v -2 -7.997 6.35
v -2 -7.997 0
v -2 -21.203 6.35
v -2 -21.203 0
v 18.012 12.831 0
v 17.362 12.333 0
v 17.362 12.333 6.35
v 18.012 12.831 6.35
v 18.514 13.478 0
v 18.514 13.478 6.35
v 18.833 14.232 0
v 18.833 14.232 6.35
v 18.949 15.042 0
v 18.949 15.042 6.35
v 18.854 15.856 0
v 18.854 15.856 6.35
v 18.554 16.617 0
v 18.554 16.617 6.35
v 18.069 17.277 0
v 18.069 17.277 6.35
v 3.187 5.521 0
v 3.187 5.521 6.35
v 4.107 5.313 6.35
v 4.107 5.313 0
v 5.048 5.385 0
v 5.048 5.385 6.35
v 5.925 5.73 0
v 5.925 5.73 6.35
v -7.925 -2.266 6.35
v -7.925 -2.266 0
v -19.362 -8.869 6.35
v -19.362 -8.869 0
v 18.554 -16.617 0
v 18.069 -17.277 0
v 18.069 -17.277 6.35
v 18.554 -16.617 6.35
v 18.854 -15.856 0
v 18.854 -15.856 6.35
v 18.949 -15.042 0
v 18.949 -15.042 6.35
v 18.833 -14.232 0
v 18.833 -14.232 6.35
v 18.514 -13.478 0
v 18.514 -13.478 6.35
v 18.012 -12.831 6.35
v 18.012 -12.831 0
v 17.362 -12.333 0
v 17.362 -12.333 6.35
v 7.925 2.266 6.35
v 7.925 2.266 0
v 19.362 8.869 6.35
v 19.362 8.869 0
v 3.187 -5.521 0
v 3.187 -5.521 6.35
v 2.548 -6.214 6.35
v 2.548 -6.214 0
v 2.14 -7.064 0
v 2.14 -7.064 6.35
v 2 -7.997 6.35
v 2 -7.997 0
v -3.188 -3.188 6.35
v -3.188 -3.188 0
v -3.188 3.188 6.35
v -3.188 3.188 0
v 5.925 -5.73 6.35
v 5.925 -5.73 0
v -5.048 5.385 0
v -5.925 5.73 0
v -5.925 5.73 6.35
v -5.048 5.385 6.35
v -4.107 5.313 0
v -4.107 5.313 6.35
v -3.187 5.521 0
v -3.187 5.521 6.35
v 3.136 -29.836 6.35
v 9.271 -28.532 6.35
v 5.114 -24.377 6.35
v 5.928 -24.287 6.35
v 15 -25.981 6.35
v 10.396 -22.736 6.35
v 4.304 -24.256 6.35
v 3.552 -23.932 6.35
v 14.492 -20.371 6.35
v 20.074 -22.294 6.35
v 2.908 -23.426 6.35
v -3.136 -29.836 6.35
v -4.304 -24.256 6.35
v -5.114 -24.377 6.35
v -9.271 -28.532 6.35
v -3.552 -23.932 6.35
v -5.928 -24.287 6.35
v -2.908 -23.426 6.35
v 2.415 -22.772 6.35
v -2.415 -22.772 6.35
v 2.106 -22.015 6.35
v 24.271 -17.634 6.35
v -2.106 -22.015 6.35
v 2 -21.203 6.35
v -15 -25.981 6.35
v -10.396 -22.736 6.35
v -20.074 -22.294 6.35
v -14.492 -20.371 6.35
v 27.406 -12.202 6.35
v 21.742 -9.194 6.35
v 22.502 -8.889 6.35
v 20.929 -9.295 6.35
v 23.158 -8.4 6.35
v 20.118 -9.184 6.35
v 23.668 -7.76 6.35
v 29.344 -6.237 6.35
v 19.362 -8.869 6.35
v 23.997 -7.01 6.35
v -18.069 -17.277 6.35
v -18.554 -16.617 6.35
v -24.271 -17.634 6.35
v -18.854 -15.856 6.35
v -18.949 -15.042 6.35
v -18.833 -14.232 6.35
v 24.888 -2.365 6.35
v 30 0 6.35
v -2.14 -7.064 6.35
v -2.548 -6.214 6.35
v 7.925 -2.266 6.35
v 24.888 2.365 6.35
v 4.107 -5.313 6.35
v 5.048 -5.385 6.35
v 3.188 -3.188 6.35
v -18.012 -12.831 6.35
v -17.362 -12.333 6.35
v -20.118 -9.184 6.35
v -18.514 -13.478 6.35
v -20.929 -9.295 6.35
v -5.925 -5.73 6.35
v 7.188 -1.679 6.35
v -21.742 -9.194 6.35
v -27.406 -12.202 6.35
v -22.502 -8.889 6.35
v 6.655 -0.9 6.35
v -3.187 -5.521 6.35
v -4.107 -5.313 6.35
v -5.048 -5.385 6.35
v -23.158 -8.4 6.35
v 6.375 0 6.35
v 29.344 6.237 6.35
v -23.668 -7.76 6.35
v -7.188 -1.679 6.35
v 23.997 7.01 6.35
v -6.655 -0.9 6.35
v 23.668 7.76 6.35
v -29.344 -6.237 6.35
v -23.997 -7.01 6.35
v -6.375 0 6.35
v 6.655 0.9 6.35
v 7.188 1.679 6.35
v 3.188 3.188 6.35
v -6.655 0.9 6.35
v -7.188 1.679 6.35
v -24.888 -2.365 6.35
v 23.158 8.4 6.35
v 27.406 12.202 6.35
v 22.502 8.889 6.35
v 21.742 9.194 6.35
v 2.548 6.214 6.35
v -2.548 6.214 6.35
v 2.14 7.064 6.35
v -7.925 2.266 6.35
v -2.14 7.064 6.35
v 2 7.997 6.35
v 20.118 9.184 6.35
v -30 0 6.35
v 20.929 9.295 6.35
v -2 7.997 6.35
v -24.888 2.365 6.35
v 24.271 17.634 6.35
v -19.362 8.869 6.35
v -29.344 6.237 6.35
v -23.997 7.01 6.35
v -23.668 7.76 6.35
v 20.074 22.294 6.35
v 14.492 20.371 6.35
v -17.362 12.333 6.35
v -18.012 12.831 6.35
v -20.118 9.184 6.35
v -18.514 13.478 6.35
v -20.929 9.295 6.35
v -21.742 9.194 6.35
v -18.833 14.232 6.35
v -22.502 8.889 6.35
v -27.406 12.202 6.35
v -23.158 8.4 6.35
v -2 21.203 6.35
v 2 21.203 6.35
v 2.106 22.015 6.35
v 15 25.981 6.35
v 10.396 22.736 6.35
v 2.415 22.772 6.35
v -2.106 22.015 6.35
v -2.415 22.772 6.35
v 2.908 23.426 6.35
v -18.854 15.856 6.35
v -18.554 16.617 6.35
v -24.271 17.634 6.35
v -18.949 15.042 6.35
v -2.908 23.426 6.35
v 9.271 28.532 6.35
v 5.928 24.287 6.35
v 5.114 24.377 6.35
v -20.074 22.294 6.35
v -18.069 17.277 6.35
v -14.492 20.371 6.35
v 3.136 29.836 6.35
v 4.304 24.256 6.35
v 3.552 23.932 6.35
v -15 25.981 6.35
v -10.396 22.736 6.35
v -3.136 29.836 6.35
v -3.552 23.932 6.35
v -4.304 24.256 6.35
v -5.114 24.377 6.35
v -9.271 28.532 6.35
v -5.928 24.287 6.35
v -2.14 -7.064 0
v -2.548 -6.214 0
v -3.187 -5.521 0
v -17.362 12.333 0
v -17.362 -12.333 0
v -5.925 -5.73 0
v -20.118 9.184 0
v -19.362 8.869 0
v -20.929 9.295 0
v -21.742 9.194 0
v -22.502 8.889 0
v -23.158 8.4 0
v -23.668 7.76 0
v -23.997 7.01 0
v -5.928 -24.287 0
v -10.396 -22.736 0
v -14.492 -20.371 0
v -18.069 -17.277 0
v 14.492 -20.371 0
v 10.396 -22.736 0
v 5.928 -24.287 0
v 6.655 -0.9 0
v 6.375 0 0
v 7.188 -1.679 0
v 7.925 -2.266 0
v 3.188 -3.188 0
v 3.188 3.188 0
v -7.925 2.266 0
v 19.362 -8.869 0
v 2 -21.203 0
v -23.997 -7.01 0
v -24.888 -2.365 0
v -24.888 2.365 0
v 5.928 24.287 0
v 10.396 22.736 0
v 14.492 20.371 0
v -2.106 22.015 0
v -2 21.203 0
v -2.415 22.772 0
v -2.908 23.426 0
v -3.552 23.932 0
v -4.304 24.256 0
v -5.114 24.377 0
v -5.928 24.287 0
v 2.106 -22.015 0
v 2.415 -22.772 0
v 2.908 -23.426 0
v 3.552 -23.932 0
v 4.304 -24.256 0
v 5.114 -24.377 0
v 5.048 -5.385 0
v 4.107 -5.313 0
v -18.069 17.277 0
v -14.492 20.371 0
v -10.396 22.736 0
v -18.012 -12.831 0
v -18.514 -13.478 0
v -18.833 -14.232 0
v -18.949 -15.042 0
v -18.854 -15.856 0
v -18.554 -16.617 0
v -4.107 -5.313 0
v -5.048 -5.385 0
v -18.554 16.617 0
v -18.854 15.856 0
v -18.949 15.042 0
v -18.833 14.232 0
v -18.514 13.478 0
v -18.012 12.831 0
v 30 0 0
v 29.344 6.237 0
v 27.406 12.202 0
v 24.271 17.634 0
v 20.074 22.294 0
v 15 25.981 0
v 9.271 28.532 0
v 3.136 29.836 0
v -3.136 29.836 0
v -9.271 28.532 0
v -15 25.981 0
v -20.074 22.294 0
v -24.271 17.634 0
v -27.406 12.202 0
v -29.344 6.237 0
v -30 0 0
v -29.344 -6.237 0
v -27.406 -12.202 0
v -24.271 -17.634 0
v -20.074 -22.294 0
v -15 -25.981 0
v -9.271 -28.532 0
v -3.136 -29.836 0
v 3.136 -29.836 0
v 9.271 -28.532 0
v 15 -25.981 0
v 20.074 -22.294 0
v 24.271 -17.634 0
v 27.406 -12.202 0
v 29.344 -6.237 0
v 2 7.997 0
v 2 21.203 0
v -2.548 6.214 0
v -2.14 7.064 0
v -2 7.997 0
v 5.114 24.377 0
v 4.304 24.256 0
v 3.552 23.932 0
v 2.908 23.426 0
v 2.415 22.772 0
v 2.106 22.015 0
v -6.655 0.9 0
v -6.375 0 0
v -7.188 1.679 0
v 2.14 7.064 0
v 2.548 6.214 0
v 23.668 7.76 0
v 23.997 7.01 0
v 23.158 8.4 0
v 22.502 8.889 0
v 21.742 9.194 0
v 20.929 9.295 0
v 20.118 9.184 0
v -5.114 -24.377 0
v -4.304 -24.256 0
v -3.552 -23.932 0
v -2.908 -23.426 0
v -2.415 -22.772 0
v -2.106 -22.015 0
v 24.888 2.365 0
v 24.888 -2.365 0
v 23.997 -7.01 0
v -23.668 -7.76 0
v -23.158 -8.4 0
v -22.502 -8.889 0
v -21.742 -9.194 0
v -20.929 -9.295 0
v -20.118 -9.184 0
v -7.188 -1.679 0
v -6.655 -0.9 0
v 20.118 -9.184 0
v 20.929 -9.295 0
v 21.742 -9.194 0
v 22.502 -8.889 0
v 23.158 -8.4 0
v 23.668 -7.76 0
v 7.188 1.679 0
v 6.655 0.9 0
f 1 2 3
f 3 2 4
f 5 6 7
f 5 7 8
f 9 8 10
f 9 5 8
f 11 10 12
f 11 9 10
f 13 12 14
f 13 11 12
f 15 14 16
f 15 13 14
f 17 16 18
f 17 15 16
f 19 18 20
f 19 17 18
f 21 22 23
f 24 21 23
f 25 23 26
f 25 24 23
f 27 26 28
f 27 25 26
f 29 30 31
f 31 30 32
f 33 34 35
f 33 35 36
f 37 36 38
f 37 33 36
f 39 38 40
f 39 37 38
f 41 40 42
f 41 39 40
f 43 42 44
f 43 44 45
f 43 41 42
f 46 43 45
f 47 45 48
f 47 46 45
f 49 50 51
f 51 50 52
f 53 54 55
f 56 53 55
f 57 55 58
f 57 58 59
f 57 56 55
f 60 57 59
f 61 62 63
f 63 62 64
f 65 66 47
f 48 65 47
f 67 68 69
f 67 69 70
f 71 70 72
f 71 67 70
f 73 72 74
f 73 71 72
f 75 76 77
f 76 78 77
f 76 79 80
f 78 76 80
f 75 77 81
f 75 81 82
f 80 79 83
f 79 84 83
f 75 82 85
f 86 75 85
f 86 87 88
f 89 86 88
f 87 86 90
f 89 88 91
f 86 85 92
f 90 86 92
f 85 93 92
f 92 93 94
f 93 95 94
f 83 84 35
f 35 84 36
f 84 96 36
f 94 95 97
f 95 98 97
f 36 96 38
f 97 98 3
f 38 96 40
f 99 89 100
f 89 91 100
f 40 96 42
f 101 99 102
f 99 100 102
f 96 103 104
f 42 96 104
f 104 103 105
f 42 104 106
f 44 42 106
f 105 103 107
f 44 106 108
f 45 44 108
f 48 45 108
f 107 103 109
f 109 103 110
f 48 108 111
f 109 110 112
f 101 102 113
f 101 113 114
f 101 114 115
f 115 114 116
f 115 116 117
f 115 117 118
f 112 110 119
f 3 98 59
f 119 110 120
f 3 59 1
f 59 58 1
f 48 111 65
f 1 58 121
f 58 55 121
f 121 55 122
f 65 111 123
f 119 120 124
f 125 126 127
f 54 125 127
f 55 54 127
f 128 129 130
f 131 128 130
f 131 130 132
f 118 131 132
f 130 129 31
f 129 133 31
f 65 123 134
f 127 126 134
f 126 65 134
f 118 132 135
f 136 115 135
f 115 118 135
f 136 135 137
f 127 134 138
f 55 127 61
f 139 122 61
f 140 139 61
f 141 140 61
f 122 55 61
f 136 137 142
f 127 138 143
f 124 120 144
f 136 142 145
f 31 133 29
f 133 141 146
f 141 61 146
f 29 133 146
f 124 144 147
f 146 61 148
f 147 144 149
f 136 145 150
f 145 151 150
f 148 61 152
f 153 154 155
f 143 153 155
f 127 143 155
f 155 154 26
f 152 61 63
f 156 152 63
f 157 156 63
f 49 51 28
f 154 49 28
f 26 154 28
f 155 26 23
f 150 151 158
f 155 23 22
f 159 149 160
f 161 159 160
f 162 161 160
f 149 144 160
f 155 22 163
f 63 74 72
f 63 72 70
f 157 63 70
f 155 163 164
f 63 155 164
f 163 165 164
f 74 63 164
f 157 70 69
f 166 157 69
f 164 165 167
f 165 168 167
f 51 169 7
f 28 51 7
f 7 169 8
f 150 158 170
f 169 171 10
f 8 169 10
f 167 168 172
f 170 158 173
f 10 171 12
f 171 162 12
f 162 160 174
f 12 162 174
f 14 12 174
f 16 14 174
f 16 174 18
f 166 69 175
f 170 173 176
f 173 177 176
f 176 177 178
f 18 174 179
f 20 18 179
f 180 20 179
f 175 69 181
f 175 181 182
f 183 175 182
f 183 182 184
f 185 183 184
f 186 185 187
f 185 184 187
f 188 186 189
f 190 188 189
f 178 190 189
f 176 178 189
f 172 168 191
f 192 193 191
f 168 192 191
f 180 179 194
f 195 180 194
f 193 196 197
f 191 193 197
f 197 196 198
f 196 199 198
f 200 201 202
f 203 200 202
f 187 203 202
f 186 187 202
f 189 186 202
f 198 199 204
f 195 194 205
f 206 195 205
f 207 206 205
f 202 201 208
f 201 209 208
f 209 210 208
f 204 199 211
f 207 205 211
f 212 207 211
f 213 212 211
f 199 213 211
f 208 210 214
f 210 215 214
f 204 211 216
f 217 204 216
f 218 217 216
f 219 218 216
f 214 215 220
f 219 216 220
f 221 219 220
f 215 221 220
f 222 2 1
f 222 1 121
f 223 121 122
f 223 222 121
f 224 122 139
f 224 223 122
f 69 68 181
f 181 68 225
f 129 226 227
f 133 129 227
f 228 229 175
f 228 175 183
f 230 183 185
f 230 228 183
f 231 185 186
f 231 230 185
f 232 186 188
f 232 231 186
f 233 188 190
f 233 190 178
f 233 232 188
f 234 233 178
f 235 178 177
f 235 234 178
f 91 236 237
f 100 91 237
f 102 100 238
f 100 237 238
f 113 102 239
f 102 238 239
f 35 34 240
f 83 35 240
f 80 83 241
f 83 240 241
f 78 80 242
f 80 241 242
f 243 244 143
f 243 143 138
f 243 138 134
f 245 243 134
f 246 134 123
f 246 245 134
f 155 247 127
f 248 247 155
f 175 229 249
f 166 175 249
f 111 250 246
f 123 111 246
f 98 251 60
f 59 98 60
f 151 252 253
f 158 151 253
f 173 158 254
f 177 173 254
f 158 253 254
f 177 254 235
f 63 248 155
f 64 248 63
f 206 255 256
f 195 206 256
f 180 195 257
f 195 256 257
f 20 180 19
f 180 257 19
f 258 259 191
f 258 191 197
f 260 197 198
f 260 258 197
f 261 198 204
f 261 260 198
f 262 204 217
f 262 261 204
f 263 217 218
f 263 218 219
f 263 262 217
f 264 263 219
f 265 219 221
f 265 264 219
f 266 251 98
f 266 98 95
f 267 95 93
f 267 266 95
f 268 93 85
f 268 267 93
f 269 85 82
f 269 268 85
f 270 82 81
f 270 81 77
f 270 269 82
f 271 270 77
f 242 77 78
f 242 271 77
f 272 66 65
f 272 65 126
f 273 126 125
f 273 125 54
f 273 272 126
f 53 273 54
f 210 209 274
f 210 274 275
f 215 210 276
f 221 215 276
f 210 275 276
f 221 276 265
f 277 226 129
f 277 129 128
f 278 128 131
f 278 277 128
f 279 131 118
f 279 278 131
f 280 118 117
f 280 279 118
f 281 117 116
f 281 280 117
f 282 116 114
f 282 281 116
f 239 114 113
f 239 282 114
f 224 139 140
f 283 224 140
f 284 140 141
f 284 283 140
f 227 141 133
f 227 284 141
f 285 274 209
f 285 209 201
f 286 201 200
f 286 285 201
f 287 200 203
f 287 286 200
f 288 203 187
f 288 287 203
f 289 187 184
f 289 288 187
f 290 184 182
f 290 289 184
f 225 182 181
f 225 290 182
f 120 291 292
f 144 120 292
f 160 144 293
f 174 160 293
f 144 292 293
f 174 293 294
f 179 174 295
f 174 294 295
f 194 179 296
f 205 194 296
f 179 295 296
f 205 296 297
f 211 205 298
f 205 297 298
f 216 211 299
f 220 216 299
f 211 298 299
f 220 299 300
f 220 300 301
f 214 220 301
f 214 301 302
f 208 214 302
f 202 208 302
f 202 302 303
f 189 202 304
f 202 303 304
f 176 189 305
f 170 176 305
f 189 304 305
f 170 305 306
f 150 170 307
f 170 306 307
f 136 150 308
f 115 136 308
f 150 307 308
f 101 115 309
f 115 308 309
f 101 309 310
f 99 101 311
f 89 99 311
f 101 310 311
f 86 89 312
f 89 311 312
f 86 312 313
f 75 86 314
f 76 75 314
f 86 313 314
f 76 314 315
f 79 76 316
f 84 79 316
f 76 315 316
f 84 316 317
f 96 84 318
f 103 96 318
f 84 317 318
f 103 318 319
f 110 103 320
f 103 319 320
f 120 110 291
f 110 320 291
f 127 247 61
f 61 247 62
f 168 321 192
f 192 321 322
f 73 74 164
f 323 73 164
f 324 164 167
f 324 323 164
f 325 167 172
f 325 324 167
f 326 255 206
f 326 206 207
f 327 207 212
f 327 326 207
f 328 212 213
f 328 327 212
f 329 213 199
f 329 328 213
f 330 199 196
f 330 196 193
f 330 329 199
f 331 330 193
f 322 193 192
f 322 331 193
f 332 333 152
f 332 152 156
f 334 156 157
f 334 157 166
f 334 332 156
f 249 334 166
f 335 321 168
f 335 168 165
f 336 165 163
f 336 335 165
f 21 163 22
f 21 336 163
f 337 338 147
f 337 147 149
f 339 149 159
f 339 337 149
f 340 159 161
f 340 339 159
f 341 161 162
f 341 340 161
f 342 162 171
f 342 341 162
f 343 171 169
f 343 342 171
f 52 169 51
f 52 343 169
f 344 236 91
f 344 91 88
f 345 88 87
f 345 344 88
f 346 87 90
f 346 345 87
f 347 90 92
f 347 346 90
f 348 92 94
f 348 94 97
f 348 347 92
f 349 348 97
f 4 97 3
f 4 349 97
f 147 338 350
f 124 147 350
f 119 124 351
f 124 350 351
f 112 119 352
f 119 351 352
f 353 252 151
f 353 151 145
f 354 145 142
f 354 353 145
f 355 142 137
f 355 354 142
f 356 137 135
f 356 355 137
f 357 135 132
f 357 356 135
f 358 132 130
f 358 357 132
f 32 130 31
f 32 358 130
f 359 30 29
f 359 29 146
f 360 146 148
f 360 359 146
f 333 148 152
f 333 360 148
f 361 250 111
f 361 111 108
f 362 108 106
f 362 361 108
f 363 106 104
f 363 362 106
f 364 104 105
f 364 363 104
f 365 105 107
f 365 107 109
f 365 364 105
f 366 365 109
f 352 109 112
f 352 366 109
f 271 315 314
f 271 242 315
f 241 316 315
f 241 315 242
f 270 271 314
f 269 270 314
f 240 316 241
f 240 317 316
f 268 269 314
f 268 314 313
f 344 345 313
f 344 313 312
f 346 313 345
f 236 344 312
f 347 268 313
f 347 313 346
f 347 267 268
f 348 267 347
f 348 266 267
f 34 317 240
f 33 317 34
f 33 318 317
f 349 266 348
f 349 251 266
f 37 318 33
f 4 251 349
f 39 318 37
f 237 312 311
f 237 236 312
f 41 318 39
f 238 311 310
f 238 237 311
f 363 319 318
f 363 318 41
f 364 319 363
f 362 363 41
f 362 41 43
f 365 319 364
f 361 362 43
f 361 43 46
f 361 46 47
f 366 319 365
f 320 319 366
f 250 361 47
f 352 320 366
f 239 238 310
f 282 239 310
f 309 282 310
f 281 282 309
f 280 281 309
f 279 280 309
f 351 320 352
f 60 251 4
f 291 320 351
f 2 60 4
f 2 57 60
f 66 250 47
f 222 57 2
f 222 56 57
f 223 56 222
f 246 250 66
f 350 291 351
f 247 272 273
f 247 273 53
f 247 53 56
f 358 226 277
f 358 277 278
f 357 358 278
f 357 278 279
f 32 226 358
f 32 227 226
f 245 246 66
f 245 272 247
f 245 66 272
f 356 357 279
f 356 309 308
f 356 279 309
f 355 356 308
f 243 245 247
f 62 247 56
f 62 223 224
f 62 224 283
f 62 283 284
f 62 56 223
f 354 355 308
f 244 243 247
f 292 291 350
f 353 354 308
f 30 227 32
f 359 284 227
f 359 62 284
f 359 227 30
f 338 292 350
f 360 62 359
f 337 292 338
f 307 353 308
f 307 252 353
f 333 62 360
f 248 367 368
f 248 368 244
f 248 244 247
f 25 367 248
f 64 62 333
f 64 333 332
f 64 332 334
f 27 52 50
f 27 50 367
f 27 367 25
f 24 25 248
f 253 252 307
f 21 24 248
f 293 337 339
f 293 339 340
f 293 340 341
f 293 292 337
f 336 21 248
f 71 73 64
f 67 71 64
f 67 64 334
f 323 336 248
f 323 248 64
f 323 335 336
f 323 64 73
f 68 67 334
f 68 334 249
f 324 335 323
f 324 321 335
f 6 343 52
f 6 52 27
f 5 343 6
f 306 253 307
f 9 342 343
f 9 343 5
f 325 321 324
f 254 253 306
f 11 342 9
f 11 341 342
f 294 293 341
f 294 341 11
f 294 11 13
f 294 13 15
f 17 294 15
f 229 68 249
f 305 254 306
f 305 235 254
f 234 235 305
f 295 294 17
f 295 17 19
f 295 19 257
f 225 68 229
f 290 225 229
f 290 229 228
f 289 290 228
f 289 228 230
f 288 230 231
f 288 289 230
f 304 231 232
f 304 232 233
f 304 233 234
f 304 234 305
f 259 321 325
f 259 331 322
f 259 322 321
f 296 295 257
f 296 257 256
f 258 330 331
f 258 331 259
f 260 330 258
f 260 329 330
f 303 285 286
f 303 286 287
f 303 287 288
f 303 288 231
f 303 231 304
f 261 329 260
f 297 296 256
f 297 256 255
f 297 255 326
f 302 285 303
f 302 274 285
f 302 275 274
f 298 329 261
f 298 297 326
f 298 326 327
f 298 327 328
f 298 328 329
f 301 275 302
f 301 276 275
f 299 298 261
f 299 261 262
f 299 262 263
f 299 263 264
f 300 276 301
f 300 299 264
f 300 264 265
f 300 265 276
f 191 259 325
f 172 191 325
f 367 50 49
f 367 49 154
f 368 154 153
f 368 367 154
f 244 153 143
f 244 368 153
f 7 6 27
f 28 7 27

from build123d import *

# Parameters (mm, degrees)
SKETCH1_R           = 30
BOSS_EXTRUDE1_DEPTH = 6.35
FILLET1_R           = 3.175
SKETCH2_W           = 6.3754
SKETCH2_H           = 6.3754
CUT_EXTRUDE1_DEPTH  = 17.462


with BuildPart() as part:
    # Sketch1 → Boss-Extrude1 (new body)
    with BuildSketch(Plane.XY):
        Circle(SKETCH1_R)
        with BuildLine():
            Line((-2, 24.919871589), (-2, 6.026815079))
            ThreePointArc((-2, 6.026815079), (-3.175, 5.499261314), (-4.219374963, 4.745458347))
            Line((-4.219374963, 4.745458347), (-20.581241855, 14.191986602))
            ThreePointArc((-20.581241855, 14.191986602), (-12.5, 21.650635095), (-2, 24.919871589))
        make_face(mode=Mode.SUBTRACT)
        with BuildLine():
            Line((-22.581241855, 10.727884987), (-6.219374963, 1.281356732))
            ThreePointArc((-6.219374963, 1.281356732), (-6.35, 0), (-6.219374963, -1.281356732))
            Line((-6.219374963, -1.281356732), (-22.581241855, -10.727884987))
            ThreePointArc((-22.581241855, -10.727884987), (-25, 0), (-22.581241855, 10.727884987))
        make_face(mode=Mode.SUBTRACT)
        with BuildLine():
            Line((-20.581241855, -14.191986602), (-4.219374963, -4.745458347))
            ThreePointArc((-4.219374963, -4.745458347), (-3.175, -5.499261314), (-2, -6.026815079))
            Line((-2, -6.026815079), (-2, -24.919871589))
            ThreePointArc((-2, -24.919871589), (-12.5, -21.650635095), (-20.581241855, -14.191986602))
        make_face(mode=Mode.SUBTRACT)
        with BuildLine():
            Line((2, -24.919871589), (2, -6.026815079))
            ThreePointArc((2, -6.026815079), (3.175, -5.499261314), (4.219374963, -4.745458347))
            Line((4.219374963, -4.745458347), (20.581241855, -14.191986602))
            ThreePointArc((20.581241855, -14.191986602), (12.5, -21.650635095), (2, -24.919871589))
        make_face(mode=Mode.SUBTRACT)
        with BuildLine():
            Line((22.581241855, -10.727884987), (6.219374963, -1.281356732))
            ThreePointArc((6.219374963, -1.281356732), (6.35, 0), (6.219374963, 1.281356732))
            Line((6.219374963, 1.281356732), (22.581241855, 10.727884987))
            ThreePointArc((22.581241855, 10.727884987), (25, 0), (22.581241855, -10.727884987))
        make_face(mode=Mode.SUBTRACT)
        with BuildLine():
            Line((20.581241855, 14.191986602), (4.219374963, 4.745458347))
            ThreePointArc((4.219374963, 4.745458347), (3.175, 5.499261314), (2, 6.026815079))
            Line((2, 6.026815079), (2, 24.919871589))
            ThreePointArc((2, 24.919871589), (12.5, 21.650635095), (20.581241855, 14.191986602))
        make_face(mode=Mode.SUBTRACT)
    extrude(amount=BOSS_EXTRUDE1_DEPTH)

    # Fillet1
    # the kernel refuses this fillet: 3.175 mm, written as the material it adds along each edge
    with BuildSketch(Plane(origin=(-22.581241855, -10.727884987, 0), x_dir=(-0.3558834781816715, 0.9345303365634076, 0), z_dir=(0, 0, 1)), Plane(origin=(22.581241855, 10.727884987, 0), x_dir=(0.3558834781815518, -0.9345303365634531, 0), z_dir=(0, 0, 1)), Plane(origin=(-20.581241855, 14.191986602, 0), x_dir=(0.63138527298033, 0.7754693011741691, 0), z_dir=(0, 0, 1))) as fillet1_piece_1:
        with BuildLine():
            CenterArc((3.725852278, -3.164933037), FILLET1_R, 85.436166165, 103.716233406)
            Line((0.591273993, -3.669951824), (0, 0))
            ThreePointArc((0, 0), (1.989243074, 0.079267427), (3.978486149, 0))
        make_face()
    extrude(amount=6.35)
    with BuildSketch(Plane(origin=(-22.581241855, 10.727884987, 0), x_dir=(-0.3558834781816212, -0.9345303365634268, 0), z_dir=(0, 0, 1)), Plane(origin=(2, -24.919871589, 0), x_dir=(0.987268751161949, 0.1590610353893298, 0), z_dir=(0, 0, 1)), Plane(origin=(22.581241855, -10.727884987, 0), x_dir=(0.35588347818151106, 0.9345303365634686, 0), z_dir=(0, 0, 1)), Plane(origin=(-2, 24.919871589, 0), x_dir=(-0.9872687511619511, -0.15906103538931676, 0), z_dir=(0, 0, 1))) as fillet1_piece_2:
        with BuildLine():
            CenterArc((3.725852278, 3.164933037), FILLET1_R, 170.847600429, 103.716233406)
            Line((0.591273993, 3.669951824), (0, 0))
            ThreePointArc((0, 0), (1.989243074, -0.079267427), (3.978486149, 0))
        make_face()
    extrude(amount=6.35)
    with BuildSketch(Plane(origin=(-20.581241855, -14.191986602, 0), x_dir=(0.8660254037844406, 0.49999999999999667, 0), z_dir=(0, 0, 1)), Plane(origin=(20.581241855, 14.191986602, 0), x_dir=(-0.8660254037844309, -0.5000000000000133, 0), z_dir=(0, 0, 1))) as fillet1_piece_3:
        with BuildLine():
            CenterArc((3.717277408, -3.175), FILLET1_R, 90, 103.716233406)
            ThreePointArc((0.632822126, -3.927835052), (0.23815281, -1.976525885), (0, 0))
            Line((0, 0), (3.717277408, 0))
        make_face()
    extrude(amount=6.35)
    with BuildSketch(Plane(origin=(-2, -24.919871589, 0), x_dir=(0, 1, 0), z_dir=(0, 0, 1)), Plane(origin=(20.581241855, -14.191986602, 0), x_dir=(-0.8660254037844468, 0.49999999999998584, 0), z_dir=(0, 0, 1)), Plane(origin=(2, 24.919871589, 0), x_dir=(0, -1, 0), z_dir=(0, 0, 1))) as fillet1_piece_4:
        with BuildLine():
            CenterArc((3.717277408, 3.175), FILLET1_R, 166.283766594, 103.716233406)
            ThreePointArc((0.632822126, 3.927835052), (0.23815281, 1.976525885), (0, 0))
            Line((0, 0), (3.717277408, 0))
        make_face()
    extrude(amount=6.35)
    with BuildSketch(Plane(origin=(4.219374963, 4.745458347, 0), x_dir=(0.8660254037844292, 0.5000000000000164, 0), z_dir=(0, 0, 1)), Plane(origin=(6.219374963, -1.281356732, 0), x_dir=(0.8660254037845205, -0.4999999999998582, 0), z_dir=(0, 0, 1)), Plane(origin=(2, -6.026815079, 0), x_dir=(0, -1, 0), z_dir=(0, 0, 1)), Plane(origin=(-2, 6.026815079, 0), x_dir=(0, 1, 0), z_dir=(0, 0, 1)), Plane(origin=(-6.219374963, 1.281356732, 0), x_dir=(-0.866025403784444, 0.49999999999999056, 0), z_dir=(0, 0, 1)), Plane(origin=(-4.219374963, -4.745458347, 0), x_dir=(-0.8660254037844402, -0.49999999999999745, 0), z_dir=(0, 0, 1))) as fillet1_piece_5:
        with BuildLine():
            CenterArc((1.969746682, 3.175), FILLET1_R, 212.909051607, 57.090948393)
            ThreePointArc((-0.695773905, 1.45), (-0.301795458, 0.747116731), (0, 0))
            Line((0, 0), (1.969746682, 0))
        make_face()
    extrude(amount=6.35)
    with BuildSketch(Plane(origin=(2, 6.026815079, 0), x_dir=(0.9015778931723624, -0.43261680797546975, 0), z_dir=(0, 0, 1)), Plane(origin=(6.219374963, 1.281356732, 0), x_dir=(0.07613180077529093, -0.9970977629654534, 0), z_dir=(0, 0, 1)), Plane(origin=(-4.219374963, 4.745458347, 0), x_dir=(0.8254460923970771, 0.5644809549899766, 0), z_dir=(0, 0, 1)), Plane(origin=(-6.219374963, -1.281356732, 0), x_dir=(-0.07613180077550848, 0.9970977629654367, 0), z_dir=(0, 0, 1)), Plane(origin=(-2, -6.026815079, 0), x_dir=(-0.9015778931724164, 0.432616807975357, 0), z_dir=(0, 0, 1))) as fillet1_piece_6:
        with BuildLine():
            CenterArc((2.010364289, 3.149438429), FILLET1_R, 205.633744341, 57.090948393)
            Line((-0.852145522, 1.775880064), (0, 0))
            ThreePointArc((0, 0), (0.804145716, 0.051123142), (1.608291431, 0))
        make_face()
    extrude(amount=6.35)
    with BuildSketch(Plane(origin=(4.219374963, -4.745458347, 0), x_dir=(0.8660254037844309, -0.5000000000000133, 0), z_dir=(0, 0, 1))) as fillet1_piece_7:
        with BuildLine():
            CenterArc((1.969746682, -3.175), FILLET1_R, 90, 57.090948393)
            ThreePointArc((-0.695773905, -1.45), (-0.301795458, -0.747116731), (0, 0))
            Line((0, 0), (1.969746682, 0))
        make_face()
    extrude(amount=6.35)

    # Sketch2 → Cut-Extrude1 (cut)
    with BuildSketch(Plane(origin=(0, 0, 0), x_dir=(-1, 0, 0), z_dir=(0, 0, -1))):
        Rectangle(SKETCH2_W, SKETCH2_H)
    extrude(amount=-CUT_EXTRUDE1_DEPTH, mode=Mode.SUBTRACT)


solid = part.part
